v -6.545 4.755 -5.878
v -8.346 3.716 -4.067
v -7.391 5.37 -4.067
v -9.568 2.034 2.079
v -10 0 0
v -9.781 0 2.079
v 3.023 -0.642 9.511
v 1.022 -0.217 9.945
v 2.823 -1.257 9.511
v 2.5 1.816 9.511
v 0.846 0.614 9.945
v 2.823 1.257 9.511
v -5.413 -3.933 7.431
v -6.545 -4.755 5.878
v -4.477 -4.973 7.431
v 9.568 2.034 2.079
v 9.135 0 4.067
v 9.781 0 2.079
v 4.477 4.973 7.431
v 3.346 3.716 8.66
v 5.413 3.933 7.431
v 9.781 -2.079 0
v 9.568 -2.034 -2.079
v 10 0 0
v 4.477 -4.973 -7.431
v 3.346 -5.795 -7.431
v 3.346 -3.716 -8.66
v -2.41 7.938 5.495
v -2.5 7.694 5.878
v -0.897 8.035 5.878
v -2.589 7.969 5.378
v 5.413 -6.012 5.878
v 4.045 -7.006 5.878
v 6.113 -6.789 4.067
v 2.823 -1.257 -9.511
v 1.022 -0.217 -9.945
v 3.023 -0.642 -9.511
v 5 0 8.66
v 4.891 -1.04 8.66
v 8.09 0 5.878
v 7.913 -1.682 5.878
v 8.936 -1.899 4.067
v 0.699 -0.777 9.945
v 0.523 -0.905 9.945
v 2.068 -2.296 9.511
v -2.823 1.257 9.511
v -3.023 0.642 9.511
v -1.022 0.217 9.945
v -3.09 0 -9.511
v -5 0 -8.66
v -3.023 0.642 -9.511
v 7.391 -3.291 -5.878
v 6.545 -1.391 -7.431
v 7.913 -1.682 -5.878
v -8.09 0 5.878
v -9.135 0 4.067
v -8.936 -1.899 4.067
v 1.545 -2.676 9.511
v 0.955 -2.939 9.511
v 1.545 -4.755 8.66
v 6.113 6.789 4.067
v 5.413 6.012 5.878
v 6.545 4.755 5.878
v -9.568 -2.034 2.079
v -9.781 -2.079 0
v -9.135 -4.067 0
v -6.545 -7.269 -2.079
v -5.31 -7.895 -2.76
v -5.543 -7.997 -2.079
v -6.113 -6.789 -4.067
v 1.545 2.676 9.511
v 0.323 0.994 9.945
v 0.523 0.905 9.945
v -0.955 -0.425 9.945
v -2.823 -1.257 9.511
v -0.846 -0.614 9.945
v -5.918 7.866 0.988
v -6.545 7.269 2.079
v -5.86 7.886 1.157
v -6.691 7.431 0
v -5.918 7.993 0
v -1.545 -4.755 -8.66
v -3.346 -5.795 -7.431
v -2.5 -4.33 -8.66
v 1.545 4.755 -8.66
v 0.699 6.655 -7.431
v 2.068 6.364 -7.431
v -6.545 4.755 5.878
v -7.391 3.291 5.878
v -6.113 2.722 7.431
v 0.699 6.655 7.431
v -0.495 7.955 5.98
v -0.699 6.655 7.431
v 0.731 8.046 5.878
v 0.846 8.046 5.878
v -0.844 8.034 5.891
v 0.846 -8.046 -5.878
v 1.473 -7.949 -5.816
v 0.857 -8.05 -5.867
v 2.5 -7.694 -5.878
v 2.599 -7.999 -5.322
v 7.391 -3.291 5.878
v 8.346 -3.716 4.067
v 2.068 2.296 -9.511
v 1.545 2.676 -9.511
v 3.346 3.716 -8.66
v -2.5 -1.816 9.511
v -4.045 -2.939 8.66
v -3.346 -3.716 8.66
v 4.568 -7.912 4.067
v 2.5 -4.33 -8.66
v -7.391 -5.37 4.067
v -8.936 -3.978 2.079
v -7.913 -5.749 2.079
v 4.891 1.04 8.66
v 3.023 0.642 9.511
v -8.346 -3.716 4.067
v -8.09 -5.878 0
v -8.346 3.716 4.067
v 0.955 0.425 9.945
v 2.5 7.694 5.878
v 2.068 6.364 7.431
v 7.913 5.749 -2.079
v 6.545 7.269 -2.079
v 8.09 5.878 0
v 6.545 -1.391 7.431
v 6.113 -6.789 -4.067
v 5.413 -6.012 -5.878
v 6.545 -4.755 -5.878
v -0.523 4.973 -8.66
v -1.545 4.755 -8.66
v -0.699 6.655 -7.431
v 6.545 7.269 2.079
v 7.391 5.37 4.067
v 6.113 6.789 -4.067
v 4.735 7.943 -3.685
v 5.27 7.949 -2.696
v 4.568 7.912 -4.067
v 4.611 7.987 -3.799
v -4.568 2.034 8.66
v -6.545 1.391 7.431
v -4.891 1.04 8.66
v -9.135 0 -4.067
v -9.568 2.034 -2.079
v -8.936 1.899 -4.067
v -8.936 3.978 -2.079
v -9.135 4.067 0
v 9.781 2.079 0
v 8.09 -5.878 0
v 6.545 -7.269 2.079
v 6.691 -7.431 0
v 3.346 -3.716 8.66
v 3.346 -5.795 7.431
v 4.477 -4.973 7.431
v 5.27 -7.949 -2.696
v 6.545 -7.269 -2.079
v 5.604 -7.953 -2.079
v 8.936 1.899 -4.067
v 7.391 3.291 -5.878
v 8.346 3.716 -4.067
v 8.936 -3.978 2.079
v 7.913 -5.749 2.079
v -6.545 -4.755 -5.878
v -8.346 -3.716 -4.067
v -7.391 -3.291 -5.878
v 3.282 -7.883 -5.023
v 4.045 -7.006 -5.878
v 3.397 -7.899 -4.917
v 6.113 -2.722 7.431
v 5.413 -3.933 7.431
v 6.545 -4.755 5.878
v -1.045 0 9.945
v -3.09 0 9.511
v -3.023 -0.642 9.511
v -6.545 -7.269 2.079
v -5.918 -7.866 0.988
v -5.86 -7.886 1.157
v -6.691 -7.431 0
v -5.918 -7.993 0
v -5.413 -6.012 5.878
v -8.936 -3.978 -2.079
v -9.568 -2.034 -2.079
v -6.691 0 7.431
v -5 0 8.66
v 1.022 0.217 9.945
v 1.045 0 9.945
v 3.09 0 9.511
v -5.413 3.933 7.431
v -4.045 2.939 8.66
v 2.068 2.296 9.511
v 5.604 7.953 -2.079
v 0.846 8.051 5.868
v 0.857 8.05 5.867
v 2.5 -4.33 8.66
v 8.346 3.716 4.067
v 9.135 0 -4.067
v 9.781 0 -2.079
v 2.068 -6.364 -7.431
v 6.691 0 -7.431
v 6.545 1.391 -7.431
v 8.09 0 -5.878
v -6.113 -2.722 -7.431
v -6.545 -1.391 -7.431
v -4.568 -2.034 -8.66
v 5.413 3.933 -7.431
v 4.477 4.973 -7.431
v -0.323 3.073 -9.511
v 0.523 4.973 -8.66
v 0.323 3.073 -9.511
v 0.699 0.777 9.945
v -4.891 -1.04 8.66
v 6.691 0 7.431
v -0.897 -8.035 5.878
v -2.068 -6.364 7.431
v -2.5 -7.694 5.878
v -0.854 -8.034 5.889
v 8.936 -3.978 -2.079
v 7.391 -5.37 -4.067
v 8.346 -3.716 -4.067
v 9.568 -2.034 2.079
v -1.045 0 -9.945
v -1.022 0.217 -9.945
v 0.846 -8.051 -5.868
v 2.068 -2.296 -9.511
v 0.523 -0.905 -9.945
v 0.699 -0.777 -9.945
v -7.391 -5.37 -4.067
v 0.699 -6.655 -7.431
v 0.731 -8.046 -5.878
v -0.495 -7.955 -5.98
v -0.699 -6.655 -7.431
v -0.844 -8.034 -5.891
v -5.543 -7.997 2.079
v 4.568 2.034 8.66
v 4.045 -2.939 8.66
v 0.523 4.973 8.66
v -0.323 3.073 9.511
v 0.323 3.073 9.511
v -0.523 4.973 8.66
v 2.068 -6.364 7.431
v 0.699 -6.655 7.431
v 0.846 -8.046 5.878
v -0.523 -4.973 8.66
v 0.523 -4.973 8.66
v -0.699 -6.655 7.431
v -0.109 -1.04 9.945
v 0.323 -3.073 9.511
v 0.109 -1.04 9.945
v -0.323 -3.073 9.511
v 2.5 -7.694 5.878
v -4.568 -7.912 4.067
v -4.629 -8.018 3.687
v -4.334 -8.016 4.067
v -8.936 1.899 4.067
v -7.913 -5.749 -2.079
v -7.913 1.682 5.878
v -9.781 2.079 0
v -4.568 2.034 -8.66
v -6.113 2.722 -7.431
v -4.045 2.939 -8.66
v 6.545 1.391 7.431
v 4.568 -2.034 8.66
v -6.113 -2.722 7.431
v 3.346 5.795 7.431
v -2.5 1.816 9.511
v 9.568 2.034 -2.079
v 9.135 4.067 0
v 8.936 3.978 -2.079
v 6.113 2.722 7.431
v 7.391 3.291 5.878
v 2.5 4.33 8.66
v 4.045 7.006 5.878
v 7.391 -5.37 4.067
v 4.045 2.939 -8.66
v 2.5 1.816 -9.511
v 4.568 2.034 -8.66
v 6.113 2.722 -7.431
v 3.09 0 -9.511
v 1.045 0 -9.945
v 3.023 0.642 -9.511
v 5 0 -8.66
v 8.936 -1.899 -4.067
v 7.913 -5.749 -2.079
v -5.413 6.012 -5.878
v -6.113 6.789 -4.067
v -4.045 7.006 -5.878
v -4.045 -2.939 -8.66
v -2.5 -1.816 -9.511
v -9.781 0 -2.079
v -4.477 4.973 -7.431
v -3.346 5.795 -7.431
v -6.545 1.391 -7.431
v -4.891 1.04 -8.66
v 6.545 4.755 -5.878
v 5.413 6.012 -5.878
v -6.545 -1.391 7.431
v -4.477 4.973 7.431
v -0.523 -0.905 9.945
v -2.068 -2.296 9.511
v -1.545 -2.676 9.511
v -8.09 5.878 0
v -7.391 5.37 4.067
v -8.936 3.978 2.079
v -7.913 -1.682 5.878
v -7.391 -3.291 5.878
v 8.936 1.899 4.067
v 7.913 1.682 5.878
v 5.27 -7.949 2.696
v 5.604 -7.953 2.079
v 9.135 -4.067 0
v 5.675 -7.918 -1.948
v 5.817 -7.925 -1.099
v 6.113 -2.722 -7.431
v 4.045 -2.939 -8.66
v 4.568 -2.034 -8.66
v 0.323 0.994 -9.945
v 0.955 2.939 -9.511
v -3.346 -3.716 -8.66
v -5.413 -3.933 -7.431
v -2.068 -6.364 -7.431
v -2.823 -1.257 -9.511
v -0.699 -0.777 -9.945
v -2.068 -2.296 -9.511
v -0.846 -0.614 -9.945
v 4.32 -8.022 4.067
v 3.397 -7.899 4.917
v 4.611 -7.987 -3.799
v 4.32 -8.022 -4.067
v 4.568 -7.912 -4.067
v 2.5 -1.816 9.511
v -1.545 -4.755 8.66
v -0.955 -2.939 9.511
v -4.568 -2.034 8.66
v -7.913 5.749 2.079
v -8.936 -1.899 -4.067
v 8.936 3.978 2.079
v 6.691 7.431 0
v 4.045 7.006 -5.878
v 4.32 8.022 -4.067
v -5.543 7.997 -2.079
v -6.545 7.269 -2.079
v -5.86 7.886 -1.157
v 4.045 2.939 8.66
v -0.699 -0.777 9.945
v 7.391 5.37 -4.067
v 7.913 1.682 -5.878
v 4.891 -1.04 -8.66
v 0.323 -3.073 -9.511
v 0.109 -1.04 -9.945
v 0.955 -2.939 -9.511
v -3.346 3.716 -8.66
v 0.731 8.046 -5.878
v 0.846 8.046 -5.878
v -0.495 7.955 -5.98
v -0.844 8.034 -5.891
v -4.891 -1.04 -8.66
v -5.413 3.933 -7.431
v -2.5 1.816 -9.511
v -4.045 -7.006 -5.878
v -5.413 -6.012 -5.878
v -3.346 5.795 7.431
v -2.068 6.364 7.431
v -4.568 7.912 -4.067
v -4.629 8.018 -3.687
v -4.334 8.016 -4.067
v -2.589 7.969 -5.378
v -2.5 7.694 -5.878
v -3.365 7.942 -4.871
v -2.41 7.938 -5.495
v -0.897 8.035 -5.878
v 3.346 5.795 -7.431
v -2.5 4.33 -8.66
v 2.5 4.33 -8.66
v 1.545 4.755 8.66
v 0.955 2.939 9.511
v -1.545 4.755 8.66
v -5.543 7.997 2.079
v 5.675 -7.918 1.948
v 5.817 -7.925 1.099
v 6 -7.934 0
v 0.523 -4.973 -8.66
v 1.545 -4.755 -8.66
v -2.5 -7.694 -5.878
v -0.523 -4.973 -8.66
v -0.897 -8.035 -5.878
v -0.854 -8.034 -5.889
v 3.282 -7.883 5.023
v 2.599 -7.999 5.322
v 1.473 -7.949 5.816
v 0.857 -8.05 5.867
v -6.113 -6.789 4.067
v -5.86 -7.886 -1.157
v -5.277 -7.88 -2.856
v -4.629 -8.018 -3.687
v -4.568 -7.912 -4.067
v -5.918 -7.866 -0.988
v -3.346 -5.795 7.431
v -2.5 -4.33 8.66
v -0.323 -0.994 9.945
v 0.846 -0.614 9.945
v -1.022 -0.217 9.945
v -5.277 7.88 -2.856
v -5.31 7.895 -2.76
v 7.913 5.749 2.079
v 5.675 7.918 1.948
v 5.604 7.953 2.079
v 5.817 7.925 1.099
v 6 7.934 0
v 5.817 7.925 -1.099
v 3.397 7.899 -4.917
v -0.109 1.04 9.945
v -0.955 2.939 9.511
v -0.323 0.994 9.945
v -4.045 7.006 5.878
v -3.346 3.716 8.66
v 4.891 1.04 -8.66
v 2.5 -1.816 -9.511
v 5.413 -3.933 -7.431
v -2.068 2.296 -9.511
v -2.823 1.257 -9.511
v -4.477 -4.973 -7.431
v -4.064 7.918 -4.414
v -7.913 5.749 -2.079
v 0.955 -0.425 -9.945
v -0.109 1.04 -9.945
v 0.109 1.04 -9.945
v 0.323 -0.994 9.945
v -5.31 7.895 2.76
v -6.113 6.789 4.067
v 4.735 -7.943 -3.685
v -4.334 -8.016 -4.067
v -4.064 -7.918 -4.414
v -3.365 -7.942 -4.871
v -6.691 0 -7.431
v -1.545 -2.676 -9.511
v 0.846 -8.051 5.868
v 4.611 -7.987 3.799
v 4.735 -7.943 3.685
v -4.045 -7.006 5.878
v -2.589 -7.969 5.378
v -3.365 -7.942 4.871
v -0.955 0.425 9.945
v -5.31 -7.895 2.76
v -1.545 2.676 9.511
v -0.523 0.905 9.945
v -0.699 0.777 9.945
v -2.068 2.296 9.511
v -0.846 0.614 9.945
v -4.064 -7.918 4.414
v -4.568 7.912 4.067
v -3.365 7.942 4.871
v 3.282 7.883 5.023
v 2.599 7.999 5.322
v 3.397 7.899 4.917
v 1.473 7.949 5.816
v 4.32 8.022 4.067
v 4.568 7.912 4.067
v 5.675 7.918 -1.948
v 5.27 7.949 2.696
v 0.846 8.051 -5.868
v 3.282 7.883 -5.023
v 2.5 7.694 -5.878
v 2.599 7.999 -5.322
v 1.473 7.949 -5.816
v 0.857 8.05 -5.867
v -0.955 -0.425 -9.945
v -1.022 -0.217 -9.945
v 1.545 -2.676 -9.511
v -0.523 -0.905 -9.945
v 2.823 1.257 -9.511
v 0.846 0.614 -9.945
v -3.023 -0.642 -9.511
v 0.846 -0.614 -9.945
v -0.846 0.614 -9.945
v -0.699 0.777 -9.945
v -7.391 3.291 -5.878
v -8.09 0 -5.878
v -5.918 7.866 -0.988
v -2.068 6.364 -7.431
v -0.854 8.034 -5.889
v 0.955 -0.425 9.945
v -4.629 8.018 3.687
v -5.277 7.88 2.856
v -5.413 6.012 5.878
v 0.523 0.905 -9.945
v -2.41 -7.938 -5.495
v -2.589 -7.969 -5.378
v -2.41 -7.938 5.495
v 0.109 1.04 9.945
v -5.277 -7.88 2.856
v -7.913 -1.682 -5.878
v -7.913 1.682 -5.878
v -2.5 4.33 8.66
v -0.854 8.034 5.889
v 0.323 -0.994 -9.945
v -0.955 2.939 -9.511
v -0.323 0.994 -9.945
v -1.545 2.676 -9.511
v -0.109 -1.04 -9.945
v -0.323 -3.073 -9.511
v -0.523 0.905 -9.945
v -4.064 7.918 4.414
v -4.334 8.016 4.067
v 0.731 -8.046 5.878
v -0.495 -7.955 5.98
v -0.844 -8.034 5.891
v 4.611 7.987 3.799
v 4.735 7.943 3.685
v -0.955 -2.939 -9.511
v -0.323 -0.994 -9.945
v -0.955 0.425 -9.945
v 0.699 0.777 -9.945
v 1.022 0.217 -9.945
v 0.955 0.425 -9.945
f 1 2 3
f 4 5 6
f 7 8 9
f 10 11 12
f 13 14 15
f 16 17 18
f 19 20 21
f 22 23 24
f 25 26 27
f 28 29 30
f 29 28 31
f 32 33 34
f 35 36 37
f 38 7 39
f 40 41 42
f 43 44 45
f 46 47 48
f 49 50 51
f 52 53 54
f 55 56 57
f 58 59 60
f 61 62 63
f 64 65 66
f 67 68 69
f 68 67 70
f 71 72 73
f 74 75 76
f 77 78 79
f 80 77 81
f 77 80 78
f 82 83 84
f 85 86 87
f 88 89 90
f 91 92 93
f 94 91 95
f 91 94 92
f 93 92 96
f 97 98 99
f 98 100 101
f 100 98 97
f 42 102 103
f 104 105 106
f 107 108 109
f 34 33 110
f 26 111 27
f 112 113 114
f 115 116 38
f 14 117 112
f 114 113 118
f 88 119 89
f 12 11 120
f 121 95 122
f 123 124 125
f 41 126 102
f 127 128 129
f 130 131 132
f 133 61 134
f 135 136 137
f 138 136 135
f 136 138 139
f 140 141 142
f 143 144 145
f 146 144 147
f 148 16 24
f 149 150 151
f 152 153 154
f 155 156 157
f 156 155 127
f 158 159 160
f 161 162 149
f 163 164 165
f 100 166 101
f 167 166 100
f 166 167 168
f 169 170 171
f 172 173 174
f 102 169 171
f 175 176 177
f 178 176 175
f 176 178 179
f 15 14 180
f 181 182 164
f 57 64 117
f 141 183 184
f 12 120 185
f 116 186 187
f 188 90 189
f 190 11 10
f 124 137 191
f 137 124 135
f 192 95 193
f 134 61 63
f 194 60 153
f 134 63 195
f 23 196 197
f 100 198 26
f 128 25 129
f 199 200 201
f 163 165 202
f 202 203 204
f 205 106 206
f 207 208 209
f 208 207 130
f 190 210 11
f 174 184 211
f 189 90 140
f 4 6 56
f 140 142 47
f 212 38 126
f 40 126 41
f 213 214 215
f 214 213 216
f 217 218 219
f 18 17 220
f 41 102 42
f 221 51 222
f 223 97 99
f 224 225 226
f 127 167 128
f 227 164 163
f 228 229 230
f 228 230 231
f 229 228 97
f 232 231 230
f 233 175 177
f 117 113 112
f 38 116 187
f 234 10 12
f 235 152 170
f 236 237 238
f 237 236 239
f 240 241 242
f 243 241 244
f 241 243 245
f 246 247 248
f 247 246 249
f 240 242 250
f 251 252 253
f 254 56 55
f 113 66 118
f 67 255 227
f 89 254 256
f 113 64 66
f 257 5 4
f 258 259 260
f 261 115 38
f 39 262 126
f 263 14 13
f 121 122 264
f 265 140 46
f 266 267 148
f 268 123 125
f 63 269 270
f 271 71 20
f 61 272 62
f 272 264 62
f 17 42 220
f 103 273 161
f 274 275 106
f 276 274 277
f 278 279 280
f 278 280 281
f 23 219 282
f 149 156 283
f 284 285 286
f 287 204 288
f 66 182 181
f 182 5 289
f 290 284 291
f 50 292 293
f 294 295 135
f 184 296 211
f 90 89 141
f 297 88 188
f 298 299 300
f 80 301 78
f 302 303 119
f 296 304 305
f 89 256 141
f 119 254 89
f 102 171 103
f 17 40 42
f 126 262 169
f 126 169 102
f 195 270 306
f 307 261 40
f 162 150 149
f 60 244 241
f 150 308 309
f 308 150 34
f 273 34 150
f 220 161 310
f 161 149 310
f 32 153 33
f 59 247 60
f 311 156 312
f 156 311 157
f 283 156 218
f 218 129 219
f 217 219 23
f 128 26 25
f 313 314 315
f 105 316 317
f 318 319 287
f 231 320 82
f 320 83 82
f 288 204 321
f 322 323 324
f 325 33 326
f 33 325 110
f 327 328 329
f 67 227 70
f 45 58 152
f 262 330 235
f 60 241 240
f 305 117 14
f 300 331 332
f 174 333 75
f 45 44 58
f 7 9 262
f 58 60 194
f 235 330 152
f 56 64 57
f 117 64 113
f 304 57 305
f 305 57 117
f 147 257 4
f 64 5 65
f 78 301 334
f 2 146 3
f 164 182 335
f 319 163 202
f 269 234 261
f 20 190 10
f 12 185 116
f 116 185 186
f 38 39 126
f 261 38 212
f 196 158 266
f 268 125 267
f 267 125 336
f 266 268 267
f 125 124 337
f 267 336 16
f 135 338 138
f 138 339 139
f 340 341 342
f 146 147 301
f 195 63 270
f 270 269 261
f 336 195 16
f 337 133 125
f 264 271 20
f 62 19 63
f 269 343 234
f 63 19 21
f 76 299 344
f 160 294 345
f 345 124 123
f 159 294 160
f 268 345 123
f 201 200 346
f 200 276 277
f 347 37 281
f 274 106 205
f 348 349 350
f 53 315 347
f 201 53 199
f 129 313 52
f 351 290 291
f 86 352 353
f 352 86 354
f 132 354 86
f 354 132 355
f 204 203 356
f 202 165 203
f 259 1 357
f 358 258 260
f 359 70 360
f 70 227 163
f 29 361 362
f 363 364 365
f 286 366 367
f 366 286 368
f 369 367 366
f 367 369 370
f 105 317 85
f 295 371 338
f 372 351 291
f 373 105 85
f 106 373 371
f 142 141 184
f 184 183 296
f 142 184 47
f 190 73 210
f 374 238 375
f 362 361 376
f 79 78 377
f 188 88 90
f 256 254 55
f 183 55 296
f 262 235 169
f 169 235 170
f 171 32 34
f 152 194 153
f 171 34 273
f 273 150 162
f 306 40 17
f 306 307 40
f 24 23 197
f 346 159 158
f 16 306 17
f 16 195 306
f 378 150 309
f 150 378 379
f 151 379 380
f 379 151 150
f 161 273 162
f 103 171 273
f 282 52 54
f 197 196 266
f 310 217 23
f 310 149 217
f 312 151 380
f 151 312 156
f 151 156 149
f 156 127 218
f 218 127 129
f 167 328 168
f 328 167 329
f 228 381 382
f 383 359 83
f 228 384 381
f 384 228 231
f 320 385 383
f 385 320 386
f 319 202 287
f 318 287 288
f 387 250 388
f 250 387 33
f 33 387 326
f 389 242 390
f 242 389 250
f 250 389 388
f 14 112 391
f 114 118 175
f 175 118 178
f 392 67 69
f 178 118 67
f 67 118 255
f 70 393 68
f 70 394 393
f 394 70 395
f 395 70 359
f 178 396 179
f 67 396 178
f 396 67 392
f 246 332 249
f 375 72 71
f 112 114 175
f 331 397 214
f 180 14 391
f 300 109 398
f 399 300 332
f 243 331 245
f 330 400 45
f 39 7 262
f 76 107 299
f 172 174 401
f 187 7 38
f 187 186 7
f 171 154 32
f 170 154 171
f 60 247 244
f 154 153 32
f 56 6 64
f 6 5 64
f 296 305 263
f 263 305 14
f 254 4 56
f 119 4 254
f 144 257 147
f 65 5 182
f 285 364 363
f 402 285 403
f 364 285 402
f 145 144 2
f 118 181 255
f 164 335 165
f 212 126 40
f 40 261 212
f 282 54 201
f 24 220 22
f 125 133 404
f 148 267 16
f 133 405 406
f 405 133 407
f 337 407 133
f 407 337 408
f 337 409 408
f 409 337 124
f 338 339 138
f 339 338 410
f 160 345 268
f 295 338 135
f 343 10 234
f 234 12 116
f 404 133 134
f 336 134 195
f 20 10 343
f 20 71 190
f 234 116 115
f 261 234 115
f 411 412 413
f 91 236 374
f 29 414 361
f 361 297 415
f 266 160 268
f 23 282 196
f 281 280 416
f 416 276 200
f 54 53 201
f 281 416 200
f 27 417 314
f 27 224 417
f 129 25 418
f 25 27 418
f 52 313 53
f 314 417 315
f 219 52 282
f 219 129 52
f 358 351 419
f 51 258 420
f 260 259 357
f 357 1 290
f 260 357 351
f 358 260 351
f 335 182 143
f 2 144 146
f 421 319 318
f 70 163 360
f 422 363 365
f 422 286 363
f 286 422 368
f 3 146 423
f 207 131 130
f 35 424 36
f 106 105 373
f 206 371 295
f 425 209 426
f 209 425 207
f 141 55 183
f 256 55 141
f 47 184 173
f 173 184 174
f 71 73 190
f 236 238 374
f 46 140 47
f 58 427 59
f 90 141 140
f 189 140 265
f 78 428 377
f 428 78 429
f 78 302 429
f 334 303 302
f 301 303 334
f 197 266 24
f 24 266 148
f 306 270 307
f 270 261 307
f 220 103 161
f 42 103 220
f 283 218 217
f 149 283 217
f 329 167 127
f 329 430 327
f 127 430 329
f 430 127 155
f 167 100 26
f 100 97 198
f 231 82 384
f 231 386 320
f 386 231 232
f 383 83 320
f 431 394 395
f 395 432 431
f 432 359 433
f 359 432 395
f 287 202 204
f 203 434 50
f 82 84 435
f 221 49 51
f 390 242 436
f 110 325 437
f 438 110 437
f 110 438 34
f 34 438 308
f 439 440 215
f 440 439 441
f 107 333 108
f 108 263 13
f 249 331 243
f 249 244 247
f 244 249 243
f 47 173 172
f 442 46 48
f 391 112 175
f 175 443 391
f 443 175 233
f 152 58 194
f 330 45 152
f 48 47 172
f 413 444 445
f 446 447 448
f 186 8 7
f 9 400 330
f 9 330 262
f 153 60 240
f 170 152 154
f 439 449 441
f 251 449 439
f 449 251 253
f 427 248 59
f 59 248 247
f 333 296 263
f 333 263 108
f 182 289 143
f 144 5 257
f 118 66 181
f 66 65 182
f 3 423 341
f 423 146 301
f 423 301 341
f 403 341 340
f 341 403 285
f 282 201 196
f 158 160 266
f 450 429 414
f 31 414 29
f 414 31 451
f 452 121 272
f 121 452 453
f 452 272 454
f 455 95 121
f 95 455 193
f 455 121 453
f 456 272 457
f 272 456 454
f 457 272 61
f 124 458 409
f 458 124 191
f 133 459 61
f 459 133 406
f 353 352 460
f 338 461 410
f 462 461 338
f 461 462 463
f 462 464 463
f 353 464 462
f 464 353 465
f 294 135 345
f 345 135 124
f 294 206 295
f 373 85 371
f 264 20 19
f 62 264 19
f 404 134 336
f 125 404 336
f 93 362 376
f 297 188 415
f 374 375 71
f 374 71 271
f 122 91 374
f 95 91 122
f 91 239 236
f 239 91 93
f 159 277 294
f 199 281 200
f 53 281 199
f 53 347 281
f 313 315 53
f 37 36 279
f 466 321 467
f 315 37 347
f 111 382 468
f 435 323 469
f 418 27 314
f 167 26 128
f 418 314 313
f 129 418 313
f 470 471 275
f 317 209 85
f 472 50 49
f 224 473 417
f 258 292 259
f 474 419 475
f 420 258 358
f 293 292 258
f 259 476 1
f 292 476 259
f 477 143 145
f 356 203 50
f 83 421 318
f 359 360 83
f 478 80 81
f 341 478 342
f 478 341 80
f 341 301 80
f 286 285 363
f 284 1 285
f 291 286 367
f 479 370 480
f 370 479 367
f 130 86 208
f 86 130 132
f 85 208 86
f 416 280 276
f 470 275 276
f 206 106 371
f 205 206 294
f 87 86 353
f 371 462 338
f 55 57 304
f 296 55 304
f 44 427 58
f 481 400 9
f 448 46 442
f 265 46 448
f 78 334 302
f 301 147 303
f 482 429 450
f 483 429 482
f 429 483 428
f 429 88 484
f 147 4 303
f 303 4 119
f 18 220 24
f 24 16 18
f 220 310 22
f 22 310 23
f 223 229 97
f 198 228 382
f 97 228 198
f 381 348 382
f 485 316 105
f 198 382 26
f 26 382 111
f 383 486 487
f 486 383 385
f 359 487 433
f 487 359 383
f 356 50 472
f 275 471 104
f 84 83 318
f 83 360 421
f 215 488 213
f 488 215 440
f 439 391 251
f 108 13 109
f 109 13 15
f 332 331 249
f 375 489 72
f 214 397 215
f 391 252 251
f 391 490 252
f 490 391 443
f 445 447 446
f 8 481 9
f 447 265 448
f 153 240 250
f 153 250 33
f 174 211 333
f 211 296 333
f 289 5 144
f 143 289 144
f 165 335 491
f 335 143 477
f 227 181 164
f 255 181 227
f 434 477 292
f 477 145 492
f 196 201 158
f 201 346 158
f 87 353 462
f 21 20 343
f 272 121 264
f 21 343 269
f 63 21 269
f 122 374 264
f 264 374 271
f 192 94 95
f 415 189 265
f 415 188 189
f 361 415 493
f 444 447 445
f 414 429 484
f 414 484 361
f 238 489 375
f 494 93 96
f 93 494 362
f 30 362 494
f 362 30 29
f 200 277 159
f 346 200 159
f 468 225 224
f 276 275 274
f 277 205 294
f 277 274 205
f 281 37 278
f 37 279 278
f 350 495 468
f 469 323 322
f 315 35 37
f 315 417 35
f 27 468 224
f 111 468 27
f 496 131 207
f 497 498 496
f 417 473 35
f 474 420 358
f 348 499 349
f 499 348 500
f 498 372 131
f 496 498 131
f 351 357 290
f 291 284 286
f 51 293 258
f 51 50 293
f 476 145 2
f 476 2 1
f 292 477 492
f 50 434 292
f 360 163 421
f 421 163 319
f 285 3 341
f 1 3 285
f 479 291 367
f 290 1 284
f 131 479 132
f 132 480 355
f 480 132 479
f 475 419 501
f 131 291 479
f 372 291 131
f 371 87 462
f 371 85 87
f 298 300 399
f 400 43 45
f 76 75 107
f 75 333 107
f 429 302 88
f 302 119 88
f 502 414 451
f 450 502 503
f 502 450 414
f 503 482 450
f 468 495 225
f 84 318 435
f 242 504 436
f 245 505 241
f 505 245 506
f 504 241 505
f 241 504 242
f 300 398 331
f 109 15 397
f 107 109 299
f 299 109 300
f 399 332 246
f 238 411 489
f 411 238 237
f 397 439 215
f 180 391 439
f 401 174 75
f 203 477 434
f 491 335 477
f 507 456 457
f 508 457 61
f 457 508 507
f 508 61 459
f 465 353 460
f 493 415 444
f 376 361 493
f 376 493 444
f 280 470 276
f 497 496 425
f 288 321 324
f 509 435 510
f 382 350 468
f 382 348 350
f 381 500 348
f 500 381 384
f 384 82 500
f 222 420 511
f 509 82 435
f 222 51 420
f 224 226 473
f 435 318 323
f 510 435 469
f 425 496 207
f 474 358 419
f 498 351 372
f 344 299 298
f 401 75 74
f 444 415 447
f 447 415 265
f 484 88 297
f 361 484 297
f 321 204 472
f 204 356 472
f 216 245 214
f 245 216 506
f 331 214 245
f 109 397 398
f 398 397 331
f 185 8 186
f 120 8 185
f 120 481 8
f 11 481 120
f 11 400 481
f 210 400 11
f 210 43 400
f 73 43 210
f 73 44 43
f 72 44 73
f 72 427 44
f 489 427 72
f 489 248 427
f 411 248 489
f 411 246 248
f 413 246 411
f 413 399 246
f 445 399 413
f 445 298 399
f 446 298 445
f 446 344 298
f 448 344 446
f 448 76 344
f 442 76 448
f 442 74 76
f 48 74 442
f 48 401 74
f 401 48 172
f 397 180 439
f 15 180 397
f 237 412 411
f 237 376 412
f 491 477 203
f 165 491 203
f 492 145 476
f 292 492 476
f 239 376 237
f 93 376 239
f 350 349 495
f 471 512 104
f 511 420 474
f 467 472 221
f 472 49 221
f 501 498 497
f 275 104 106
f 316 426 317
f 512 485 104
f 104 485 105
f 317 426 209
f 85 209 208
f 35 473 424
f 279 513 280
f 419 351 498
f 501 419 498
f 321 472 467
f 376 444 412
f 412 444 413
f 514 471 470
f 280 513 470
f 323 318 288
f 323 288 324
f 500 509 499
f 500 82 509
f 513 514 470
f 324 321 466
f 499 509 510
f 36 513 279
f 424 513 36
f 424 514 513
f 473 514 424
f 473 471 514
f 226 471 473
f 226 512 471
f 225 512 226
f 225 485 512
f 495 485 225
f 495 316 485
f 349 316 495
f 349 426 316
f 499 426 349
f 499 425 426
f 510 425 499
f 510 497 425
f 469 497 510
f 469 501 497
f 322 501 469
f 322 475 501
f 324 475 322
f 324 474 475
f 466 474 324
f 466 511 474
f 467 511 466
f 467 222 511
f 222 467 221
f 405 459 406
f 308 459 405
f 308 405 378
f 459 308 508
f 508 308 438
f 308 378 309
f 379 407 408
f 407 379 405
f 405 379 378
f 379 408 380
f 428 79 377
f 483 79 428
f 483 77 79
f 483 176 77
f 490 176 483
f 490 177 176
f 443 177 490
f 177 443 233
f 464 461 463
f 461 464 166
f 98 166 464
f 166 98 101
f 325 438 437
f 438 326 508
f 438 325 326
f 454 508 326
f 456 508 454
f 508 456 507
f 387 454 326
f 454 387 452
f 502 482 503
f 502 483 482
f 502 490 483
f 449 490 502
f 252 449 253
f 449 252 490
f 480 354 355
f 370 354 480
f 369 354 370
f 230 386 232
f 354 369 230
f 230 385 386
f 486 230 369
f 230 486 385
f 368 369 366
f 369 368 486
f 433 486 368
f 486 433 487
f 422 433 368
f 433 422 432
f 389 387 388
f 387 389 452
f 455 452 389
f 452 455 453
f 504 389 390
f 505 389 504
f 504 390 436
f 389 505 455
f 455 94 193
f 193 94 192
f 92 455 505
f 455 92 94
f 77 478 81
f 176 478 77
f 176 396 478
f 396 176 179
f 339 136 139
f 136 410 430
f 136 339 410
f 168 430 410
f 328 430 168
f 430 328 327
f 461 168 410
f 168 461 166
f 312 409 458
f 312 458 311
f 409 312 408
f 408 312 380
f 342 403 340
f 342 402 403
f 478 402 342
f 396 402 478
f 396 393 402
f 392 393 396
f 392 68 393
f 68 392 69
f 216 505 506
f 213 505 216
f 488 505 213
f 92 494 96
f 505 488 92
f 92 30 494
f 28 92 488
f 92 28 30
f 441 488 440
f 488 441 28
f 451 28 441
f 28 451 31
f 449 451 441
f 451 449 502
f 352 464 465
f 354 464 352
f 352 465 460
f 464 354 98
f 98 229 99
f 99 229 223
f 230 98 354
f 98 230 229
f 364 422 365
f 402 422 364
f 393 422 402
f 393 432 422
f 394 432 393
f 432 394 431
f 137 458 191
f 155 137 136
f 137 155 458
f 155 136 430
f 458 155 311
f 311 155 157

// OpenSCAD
module all_transparent() {
 %children();
}

module first_transparent() {
 %children(0);
}

difference() {
  sphere(r=10);
  all_transparent() cylinder(h=30, r=6, center=true);
  first_transparent() rotate([90,0,0]) cylinder(h=30, r=6, center=true);
}
